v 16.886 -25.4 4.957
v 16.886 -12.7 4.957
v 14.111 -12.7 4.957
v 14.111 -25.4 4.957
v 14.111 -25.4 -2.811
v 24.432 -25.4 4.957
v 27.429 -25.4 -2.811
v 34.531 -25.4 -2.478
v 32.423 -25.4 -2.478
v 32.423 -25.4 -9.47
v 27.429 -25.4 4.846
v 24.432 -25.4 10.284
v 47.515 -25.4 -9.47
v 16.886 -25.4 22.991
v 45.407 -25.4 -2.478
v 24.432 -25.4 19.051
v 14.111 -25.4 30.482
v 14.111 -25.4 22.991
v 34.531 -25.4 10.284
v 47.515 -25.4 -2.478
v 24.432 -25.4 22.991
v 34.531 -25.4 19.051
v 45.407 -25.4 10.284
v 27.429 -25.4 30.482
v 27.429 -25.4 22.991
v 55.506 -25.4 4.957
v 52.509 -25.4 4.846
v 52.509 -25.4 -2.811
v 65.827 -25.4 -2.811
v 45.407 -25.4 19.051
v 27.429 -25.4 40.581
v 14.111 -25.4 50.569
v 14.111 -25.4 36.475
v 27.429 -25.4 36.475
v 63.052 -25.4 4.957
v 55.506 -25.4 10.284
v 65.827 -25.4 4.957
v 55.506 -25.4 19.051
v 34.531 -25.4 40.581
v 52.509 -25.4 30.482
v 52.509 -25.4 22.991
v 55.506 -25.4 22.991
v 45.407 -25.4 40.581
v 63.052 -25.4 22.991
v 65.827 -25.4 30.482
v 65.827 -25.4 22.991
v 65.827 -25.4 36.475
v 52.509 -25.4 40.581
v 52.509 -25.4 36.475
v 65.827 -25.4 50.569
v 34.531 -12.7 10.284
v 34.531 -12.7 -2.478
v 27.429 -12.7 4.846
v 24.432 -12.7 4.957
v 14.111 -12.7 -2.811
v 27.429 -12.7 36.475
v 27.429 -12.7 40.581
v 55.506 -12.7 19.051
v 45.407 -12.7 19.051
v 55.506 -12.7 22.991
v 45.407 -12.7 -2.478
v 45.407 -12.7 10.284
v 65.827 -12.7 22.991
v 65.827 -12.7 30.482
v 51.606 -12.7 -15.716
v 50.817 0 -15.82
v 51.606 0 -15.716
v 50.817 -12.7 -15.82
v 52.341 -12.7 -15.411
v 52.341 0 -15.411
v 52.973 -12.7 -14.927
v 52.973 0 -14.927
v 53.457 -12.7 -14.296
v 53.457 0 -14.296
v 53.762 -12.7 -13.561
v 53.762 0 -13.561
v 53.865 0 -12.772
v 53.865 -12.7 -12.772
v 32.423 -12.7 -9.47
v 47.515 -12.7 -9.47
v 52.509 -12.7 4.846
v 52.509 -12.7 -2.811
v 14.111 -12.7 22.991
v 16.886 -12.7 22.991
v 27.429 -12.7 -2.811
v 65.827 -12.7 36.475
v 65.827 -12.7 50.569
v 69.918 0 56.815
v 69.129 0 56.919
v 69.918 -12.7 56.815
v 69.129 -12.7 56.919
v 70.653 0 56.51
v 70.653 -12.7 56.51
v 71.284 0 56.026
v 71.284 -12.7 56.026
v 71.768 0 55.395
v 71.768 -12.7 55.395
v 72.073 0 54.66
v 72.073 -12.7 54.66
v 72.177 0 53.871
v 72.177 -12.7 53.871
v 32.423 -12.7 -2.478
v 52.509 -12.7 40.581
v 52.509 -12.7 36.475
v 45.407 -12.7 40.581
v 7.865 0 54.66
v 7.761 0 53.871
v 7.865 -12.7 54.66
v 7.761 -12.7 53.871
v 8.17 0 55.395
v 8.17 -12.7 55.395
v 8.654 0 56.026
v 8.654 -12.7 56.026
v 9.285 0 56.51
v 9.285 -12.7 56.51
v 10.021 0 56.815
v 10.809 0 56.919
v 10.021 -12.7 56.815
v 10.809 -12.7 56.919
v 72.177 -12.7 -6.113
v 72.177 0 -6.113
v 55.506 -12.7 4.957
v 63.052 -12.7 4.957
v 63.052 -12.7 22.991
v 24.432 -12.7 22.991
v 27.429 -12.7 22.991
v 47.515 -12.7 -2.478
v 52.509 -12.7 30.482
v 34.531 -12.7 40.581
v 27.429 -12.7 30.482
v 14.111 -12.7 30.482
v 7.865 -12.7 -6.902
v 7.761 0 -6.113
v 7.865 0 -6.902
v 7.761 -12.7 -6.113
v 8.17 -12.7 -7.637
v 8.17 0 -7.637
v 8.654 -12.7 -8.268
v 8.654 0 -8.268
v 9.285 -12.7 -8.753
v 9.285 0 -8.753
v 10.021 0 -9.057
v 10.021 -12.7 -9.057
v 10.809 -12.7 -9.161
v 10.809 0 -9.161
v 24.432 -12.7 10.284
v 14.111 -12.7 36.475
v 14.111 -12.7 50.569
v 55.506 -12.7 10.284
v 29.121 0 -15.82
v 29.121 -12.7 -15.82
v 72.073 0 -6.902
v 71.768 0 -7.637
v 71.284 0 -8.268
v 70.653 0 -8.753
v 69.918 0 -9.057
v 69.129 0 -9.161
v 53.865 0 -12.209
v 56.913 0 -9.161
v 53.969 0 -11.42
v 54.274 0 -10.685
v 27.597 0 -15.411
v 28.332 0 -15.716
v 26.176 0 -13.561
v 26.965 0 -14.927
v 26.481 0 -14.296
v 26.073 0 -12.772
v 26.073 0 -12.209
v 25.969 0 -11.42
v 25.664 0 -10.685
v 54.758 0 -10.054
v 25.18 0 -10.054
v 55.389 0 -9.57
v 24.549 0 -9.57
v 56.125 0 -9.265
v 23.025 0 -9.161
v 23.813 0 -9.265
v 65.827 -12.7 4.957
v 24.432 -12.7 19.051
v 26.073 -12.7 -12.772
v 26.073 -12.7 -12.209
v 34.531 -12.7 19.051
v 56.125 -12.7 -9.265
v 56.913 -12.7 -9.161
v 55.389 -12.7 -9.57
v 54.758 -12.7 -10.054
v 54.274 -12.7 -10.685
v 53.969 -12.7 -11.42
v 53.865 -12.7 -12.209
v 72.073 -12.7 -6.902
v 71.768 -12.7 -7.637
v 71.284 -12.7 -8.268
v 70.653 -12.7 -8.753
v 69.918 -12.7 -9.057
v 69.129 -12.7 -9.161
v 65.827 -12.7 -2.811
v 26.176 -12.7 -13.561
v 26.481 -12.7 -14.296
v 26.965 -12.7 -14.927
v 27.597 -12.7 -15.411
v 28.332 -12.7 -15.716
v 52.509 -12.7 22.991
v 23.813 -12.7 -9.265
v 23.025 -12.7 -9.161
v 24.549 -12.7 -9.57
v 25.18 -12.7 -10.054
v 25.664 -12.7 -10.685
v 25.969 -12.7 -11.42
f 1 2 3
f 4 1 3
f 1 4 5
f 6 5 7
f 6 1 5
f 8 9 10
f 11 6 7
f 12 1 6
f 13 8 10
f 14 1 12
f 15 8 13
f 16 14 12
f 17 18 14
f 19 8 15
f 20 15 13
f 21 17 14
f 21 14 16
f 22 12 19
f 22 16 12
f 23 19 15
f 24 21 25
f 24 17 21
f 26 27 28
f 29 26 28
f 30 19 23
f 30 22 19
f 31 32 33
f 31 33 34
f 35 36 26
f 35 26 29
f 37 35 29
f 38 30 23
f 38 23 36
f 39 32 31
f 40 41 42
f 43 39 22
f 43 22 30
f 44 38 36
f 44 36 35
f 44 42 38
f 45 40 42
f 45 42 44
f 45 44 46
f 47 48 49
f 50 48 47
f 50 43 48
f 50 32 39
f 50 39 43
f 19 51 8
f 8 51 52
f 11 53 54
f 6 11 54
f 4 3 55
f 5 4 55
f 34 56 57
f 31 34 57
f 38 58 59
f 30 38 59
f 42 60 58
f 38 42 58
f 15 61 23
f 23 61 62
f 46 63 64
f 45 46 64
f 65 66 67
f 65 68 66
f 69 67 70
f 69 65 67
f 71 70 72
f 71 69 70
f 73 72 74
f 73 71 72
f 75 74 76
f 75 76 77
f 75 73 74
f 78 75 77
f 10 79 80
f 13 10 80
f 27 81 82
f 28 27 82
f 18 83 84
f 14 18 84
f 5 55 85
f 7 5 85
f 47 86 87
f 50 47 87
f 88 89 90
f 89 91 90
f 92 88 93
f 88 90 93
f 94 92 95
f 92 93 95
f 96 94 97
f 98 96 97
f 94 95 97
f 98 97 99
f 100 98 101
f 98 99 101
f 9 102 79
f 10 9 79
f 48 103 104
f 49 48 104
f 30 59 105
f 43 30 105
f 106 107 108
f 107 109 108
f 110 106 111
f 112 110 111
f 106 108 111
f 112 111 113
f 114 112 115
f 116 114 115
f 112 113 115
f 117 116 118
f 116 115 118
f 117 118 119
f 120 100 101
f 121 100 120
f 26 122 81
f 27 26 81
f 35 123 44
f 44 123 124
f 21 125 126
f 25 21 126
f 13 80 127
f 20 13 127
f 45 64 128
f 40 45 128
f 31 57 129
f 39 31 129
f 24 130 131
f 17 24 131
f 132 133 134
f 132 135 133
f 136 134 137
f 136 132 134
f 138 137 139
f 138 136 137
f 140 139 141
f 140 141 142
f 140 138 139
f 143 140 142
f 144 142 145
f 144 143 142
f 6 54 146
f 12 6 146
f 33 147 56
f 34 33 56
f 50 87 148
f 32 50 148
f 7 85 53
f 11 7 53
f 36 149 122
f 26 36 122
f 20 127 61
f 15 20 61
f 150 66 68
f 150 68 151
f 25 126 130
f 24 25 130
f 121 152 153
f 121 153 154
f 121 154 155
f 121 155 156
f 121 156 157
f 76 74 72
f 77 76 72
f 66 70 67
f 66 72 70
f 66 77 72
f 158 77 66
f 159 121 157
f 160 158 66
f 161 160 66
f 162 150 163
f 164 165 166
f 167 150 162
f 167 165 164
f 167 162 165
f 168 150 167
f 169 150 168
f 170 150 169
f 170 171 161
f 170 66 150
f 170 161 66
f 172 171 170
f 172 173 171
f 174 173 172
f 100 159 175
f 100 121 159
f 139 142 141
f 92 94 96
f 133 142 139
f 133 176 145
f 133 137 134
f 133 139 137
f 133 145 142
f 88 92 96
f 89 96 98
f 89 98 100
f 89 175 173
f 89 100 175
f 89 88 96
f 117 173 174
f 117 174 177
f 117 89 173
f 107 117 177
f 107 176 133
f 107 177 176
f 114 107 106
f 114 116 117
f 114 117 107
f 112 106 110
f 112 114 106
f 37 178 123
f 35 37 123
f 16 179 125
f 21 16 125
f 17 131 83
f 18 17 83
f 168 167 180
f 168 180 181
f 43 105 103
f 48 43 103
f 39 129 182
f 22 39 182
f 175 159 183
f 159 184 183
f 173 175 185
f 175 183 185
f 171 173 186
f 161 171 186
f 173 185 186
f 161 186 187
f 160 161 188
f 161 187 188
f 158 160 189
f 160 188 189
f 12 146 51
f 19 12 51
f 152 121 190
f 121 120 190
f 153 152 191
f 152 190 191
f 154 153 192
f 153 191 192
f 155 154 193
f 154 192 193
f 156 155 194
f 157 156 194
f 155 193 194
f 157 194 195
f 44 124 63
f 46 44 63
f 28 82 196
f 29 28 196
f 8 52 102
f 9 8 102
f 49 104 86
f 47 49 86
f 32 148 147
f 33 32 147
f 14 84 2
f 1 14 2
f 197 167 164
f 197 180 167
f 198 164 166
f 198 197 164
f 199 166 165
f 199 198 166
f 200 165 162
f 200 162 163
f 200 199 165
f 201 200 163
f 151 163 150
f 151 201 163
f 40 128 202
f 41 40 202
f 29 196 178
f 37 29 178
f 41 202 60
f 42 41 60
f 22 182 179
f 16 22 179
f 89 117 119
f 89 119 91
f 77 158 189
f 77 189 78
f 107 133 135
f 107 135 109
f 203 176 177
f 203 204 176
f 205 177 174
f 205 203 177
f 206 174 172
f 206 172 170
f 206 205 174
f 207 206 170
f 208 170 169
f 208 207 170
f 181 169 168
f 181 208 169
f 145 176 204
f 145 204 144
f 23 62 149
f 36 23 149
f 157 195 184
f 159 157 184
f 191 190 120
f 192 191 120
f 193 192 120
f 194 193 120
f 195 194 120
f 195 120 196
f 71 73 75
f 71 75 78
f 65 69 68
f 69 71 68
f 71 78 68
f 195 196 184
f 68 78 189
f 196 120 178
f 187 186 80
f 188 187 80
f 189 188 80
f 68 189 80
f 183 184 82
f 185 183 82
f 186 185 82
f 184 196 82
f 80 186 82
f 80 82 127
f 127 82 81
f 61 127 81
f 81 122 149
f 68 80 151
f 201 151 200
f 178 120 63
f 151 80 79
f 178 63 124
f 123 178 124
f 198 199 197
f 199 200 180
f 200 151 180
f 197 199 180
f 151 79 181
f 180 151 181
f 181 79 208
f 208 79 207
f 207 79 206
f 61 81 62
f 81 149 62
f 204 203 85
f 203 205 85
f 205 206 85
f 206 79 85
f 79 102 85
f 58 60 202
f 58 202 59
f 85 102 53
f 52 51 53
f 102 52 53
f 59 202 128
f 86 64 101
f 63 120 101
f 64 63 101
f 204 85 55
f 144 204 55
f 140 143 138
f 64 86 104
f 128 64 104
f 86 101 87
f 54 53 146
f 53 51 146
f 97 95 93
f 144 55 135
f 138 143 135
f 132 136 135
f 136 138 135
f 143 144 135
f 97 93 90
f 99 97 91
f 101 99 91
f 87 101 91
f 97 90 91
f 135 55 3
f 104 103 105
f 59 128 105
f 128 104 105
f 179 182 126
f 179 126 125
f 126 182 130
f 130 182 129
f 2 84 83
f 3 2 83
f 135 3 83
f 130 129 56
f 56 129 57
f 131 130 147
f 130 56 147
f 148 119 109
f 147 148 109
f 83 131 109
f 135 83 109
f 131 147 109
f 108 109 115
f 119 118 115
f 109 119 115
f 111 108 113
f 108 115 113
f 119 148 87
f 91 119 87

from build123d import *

# Parameters (mm, degrees)
F1_DEPTH = 25.4
F3_DEPTH = 12.7
F4_R     = 3.048


with BuildPart() as f1:
    # F0 (on Front) → F1 (new body)
    with BuildSketch(Plane.XZ):
        Polygon((65.826714, 50.568782), (14.111398, 50.568782), (14.111398, 36.474694), (27.428646, 36.474694), (27.428646, 40.580846), (34.53118, 40.580846), (34.53118, 19.051294), (24.432266, 19.051294), (24.432266, 22.990979), (27.428646, 22.990979), (27.428646, 30.481933), (14.111398, 30.481933), (14.111398, 22.990979), (16.885825, 22.990979), (16.885825, 4.957206), (14.111398, 4.957206), (14.111398, -2.81119), (27.428646, -2.81119), (27.428646, 4.846229), (24.432266, 4.957206), (24.432266, 10.284104), (34.53118, 10.284104), (34.53118, -2.478259), (32.422613, -2.478259), (32.422613, -9.469814), (47.515498, -9.469814), (47.515498, -2.478259), (45.406932, -2.478259), (45.406932, 10.284104), (55.505846, 10.284104), (55.505846, 4.957206), (52.509466, 4.846229), (52.509466, -2.81119), (65.826714, -2.81119), (65.826714, 4.957206), (63.052287, 4.957206), (63.052287, 22.990979), (65.826714, 22.990979), (65.826714, 30.481933), (52.509466, 30.481933), (52.509466, 22.990979), (55.505846, 22.990979), (55.505846, 19.051294), (45.406932, 19.051294), (45.406932, 40.580846), (52.509466, 40.580846), (52.509466, 36.474694), (65.826714, 36.474694), align=None)
    extrude(amount=F1_DEPTH)

    # F2 (on face) → F3 (join)
    with BuildSketch(Plane(origin=(0, 0, 0), x_dir=(-1, 0, 0), z_dir=(0, 1, 0))):
        Polygon((-7.761398, -9.16119), (-7.761398, 56.918782), (-72.176714, 56.918782), (-72.176714, -9.16119), (-53.865498, -9.16119), (-53.865498, -15.819814), (-26.072614, -15.819814), (-26.072614, -9.16119), align=None)
        Polygon((-65.826714, 50.568782), (-14.111398, 50.568782), (-14.111398, 36.474694), (-27.428646, 36.474694), (-27.428646, 40.580846), (-34.53118, 40.580846), (-34.53118, 19.051294), (-24.432266, 19.051294), (-24.432266, 22.990979), (-27.428646, 22.990979), (-27.428646, 30.481933), (-14.111398, 30.481933), (-14.111398, 22.990979), (-16.885825, 22.990979), (-16.885825, 4.957206), (-14.111398, 4.957206), (-14.111398, -2.81119), (-27.428646, -2.81119), (-27.428646, 4.846229), (-24.432266, 4.957206), (-24.432266, 10.284104), (-34.53118, 10.284104), (-34.53118, -2.478259), (-32.422613, -2.478259), (-32.422613, -9.469814), (-47.515498, -9.469814), (-47.515498, -2.478259), (-45.406932, -2.478259), (-45.406932, 10.284104), (-55.505846, 10.284104), (-55.505846, 4.957206), (-52.509466, 4.846229), (-52.509466, -2.81119), (-65.826714, -2.81119), (-65.826714, 4.957206), (-63.052287, 4.957206), (-63.052287, 22.990979), (-65.826714, 22.990979), (-65.826714, 30.481933), (-52.509466, 30.481933), (-52.509466, 22.990979), (-55.505846, 22.990979), (-55.505846, 19.051294), (-45.406932, 19.051294), (-45.406932, 40.580846), (-52.509466, 40.580846), (-52.509466, 36.474694), (-65.826714, 36.474694), align=None, mode=Mode.SUBTRACT)
    extrude(amount=-F3_DEPTH)

    # F4
    f4_edges = [f1.edges().sort_by_distance(p)[0] for p in [
        (7.761398, -6.35, -9.16119),
        (26.072614, -6.35, -9.16119),
        (26.072614, -6.35, -15.819814),
        (53.865498, -6.35, -15.819814),
        (53.865498, -6.35, -9.16119),
        (72.176714, -6.35, -9.16119),
        (72.176714, -6.35, 56.918782),
        (7.761398, -6.35, 56.918782),
    ]]
    fillet(f4_edges, radius=F4_R)


solid = f1.part
